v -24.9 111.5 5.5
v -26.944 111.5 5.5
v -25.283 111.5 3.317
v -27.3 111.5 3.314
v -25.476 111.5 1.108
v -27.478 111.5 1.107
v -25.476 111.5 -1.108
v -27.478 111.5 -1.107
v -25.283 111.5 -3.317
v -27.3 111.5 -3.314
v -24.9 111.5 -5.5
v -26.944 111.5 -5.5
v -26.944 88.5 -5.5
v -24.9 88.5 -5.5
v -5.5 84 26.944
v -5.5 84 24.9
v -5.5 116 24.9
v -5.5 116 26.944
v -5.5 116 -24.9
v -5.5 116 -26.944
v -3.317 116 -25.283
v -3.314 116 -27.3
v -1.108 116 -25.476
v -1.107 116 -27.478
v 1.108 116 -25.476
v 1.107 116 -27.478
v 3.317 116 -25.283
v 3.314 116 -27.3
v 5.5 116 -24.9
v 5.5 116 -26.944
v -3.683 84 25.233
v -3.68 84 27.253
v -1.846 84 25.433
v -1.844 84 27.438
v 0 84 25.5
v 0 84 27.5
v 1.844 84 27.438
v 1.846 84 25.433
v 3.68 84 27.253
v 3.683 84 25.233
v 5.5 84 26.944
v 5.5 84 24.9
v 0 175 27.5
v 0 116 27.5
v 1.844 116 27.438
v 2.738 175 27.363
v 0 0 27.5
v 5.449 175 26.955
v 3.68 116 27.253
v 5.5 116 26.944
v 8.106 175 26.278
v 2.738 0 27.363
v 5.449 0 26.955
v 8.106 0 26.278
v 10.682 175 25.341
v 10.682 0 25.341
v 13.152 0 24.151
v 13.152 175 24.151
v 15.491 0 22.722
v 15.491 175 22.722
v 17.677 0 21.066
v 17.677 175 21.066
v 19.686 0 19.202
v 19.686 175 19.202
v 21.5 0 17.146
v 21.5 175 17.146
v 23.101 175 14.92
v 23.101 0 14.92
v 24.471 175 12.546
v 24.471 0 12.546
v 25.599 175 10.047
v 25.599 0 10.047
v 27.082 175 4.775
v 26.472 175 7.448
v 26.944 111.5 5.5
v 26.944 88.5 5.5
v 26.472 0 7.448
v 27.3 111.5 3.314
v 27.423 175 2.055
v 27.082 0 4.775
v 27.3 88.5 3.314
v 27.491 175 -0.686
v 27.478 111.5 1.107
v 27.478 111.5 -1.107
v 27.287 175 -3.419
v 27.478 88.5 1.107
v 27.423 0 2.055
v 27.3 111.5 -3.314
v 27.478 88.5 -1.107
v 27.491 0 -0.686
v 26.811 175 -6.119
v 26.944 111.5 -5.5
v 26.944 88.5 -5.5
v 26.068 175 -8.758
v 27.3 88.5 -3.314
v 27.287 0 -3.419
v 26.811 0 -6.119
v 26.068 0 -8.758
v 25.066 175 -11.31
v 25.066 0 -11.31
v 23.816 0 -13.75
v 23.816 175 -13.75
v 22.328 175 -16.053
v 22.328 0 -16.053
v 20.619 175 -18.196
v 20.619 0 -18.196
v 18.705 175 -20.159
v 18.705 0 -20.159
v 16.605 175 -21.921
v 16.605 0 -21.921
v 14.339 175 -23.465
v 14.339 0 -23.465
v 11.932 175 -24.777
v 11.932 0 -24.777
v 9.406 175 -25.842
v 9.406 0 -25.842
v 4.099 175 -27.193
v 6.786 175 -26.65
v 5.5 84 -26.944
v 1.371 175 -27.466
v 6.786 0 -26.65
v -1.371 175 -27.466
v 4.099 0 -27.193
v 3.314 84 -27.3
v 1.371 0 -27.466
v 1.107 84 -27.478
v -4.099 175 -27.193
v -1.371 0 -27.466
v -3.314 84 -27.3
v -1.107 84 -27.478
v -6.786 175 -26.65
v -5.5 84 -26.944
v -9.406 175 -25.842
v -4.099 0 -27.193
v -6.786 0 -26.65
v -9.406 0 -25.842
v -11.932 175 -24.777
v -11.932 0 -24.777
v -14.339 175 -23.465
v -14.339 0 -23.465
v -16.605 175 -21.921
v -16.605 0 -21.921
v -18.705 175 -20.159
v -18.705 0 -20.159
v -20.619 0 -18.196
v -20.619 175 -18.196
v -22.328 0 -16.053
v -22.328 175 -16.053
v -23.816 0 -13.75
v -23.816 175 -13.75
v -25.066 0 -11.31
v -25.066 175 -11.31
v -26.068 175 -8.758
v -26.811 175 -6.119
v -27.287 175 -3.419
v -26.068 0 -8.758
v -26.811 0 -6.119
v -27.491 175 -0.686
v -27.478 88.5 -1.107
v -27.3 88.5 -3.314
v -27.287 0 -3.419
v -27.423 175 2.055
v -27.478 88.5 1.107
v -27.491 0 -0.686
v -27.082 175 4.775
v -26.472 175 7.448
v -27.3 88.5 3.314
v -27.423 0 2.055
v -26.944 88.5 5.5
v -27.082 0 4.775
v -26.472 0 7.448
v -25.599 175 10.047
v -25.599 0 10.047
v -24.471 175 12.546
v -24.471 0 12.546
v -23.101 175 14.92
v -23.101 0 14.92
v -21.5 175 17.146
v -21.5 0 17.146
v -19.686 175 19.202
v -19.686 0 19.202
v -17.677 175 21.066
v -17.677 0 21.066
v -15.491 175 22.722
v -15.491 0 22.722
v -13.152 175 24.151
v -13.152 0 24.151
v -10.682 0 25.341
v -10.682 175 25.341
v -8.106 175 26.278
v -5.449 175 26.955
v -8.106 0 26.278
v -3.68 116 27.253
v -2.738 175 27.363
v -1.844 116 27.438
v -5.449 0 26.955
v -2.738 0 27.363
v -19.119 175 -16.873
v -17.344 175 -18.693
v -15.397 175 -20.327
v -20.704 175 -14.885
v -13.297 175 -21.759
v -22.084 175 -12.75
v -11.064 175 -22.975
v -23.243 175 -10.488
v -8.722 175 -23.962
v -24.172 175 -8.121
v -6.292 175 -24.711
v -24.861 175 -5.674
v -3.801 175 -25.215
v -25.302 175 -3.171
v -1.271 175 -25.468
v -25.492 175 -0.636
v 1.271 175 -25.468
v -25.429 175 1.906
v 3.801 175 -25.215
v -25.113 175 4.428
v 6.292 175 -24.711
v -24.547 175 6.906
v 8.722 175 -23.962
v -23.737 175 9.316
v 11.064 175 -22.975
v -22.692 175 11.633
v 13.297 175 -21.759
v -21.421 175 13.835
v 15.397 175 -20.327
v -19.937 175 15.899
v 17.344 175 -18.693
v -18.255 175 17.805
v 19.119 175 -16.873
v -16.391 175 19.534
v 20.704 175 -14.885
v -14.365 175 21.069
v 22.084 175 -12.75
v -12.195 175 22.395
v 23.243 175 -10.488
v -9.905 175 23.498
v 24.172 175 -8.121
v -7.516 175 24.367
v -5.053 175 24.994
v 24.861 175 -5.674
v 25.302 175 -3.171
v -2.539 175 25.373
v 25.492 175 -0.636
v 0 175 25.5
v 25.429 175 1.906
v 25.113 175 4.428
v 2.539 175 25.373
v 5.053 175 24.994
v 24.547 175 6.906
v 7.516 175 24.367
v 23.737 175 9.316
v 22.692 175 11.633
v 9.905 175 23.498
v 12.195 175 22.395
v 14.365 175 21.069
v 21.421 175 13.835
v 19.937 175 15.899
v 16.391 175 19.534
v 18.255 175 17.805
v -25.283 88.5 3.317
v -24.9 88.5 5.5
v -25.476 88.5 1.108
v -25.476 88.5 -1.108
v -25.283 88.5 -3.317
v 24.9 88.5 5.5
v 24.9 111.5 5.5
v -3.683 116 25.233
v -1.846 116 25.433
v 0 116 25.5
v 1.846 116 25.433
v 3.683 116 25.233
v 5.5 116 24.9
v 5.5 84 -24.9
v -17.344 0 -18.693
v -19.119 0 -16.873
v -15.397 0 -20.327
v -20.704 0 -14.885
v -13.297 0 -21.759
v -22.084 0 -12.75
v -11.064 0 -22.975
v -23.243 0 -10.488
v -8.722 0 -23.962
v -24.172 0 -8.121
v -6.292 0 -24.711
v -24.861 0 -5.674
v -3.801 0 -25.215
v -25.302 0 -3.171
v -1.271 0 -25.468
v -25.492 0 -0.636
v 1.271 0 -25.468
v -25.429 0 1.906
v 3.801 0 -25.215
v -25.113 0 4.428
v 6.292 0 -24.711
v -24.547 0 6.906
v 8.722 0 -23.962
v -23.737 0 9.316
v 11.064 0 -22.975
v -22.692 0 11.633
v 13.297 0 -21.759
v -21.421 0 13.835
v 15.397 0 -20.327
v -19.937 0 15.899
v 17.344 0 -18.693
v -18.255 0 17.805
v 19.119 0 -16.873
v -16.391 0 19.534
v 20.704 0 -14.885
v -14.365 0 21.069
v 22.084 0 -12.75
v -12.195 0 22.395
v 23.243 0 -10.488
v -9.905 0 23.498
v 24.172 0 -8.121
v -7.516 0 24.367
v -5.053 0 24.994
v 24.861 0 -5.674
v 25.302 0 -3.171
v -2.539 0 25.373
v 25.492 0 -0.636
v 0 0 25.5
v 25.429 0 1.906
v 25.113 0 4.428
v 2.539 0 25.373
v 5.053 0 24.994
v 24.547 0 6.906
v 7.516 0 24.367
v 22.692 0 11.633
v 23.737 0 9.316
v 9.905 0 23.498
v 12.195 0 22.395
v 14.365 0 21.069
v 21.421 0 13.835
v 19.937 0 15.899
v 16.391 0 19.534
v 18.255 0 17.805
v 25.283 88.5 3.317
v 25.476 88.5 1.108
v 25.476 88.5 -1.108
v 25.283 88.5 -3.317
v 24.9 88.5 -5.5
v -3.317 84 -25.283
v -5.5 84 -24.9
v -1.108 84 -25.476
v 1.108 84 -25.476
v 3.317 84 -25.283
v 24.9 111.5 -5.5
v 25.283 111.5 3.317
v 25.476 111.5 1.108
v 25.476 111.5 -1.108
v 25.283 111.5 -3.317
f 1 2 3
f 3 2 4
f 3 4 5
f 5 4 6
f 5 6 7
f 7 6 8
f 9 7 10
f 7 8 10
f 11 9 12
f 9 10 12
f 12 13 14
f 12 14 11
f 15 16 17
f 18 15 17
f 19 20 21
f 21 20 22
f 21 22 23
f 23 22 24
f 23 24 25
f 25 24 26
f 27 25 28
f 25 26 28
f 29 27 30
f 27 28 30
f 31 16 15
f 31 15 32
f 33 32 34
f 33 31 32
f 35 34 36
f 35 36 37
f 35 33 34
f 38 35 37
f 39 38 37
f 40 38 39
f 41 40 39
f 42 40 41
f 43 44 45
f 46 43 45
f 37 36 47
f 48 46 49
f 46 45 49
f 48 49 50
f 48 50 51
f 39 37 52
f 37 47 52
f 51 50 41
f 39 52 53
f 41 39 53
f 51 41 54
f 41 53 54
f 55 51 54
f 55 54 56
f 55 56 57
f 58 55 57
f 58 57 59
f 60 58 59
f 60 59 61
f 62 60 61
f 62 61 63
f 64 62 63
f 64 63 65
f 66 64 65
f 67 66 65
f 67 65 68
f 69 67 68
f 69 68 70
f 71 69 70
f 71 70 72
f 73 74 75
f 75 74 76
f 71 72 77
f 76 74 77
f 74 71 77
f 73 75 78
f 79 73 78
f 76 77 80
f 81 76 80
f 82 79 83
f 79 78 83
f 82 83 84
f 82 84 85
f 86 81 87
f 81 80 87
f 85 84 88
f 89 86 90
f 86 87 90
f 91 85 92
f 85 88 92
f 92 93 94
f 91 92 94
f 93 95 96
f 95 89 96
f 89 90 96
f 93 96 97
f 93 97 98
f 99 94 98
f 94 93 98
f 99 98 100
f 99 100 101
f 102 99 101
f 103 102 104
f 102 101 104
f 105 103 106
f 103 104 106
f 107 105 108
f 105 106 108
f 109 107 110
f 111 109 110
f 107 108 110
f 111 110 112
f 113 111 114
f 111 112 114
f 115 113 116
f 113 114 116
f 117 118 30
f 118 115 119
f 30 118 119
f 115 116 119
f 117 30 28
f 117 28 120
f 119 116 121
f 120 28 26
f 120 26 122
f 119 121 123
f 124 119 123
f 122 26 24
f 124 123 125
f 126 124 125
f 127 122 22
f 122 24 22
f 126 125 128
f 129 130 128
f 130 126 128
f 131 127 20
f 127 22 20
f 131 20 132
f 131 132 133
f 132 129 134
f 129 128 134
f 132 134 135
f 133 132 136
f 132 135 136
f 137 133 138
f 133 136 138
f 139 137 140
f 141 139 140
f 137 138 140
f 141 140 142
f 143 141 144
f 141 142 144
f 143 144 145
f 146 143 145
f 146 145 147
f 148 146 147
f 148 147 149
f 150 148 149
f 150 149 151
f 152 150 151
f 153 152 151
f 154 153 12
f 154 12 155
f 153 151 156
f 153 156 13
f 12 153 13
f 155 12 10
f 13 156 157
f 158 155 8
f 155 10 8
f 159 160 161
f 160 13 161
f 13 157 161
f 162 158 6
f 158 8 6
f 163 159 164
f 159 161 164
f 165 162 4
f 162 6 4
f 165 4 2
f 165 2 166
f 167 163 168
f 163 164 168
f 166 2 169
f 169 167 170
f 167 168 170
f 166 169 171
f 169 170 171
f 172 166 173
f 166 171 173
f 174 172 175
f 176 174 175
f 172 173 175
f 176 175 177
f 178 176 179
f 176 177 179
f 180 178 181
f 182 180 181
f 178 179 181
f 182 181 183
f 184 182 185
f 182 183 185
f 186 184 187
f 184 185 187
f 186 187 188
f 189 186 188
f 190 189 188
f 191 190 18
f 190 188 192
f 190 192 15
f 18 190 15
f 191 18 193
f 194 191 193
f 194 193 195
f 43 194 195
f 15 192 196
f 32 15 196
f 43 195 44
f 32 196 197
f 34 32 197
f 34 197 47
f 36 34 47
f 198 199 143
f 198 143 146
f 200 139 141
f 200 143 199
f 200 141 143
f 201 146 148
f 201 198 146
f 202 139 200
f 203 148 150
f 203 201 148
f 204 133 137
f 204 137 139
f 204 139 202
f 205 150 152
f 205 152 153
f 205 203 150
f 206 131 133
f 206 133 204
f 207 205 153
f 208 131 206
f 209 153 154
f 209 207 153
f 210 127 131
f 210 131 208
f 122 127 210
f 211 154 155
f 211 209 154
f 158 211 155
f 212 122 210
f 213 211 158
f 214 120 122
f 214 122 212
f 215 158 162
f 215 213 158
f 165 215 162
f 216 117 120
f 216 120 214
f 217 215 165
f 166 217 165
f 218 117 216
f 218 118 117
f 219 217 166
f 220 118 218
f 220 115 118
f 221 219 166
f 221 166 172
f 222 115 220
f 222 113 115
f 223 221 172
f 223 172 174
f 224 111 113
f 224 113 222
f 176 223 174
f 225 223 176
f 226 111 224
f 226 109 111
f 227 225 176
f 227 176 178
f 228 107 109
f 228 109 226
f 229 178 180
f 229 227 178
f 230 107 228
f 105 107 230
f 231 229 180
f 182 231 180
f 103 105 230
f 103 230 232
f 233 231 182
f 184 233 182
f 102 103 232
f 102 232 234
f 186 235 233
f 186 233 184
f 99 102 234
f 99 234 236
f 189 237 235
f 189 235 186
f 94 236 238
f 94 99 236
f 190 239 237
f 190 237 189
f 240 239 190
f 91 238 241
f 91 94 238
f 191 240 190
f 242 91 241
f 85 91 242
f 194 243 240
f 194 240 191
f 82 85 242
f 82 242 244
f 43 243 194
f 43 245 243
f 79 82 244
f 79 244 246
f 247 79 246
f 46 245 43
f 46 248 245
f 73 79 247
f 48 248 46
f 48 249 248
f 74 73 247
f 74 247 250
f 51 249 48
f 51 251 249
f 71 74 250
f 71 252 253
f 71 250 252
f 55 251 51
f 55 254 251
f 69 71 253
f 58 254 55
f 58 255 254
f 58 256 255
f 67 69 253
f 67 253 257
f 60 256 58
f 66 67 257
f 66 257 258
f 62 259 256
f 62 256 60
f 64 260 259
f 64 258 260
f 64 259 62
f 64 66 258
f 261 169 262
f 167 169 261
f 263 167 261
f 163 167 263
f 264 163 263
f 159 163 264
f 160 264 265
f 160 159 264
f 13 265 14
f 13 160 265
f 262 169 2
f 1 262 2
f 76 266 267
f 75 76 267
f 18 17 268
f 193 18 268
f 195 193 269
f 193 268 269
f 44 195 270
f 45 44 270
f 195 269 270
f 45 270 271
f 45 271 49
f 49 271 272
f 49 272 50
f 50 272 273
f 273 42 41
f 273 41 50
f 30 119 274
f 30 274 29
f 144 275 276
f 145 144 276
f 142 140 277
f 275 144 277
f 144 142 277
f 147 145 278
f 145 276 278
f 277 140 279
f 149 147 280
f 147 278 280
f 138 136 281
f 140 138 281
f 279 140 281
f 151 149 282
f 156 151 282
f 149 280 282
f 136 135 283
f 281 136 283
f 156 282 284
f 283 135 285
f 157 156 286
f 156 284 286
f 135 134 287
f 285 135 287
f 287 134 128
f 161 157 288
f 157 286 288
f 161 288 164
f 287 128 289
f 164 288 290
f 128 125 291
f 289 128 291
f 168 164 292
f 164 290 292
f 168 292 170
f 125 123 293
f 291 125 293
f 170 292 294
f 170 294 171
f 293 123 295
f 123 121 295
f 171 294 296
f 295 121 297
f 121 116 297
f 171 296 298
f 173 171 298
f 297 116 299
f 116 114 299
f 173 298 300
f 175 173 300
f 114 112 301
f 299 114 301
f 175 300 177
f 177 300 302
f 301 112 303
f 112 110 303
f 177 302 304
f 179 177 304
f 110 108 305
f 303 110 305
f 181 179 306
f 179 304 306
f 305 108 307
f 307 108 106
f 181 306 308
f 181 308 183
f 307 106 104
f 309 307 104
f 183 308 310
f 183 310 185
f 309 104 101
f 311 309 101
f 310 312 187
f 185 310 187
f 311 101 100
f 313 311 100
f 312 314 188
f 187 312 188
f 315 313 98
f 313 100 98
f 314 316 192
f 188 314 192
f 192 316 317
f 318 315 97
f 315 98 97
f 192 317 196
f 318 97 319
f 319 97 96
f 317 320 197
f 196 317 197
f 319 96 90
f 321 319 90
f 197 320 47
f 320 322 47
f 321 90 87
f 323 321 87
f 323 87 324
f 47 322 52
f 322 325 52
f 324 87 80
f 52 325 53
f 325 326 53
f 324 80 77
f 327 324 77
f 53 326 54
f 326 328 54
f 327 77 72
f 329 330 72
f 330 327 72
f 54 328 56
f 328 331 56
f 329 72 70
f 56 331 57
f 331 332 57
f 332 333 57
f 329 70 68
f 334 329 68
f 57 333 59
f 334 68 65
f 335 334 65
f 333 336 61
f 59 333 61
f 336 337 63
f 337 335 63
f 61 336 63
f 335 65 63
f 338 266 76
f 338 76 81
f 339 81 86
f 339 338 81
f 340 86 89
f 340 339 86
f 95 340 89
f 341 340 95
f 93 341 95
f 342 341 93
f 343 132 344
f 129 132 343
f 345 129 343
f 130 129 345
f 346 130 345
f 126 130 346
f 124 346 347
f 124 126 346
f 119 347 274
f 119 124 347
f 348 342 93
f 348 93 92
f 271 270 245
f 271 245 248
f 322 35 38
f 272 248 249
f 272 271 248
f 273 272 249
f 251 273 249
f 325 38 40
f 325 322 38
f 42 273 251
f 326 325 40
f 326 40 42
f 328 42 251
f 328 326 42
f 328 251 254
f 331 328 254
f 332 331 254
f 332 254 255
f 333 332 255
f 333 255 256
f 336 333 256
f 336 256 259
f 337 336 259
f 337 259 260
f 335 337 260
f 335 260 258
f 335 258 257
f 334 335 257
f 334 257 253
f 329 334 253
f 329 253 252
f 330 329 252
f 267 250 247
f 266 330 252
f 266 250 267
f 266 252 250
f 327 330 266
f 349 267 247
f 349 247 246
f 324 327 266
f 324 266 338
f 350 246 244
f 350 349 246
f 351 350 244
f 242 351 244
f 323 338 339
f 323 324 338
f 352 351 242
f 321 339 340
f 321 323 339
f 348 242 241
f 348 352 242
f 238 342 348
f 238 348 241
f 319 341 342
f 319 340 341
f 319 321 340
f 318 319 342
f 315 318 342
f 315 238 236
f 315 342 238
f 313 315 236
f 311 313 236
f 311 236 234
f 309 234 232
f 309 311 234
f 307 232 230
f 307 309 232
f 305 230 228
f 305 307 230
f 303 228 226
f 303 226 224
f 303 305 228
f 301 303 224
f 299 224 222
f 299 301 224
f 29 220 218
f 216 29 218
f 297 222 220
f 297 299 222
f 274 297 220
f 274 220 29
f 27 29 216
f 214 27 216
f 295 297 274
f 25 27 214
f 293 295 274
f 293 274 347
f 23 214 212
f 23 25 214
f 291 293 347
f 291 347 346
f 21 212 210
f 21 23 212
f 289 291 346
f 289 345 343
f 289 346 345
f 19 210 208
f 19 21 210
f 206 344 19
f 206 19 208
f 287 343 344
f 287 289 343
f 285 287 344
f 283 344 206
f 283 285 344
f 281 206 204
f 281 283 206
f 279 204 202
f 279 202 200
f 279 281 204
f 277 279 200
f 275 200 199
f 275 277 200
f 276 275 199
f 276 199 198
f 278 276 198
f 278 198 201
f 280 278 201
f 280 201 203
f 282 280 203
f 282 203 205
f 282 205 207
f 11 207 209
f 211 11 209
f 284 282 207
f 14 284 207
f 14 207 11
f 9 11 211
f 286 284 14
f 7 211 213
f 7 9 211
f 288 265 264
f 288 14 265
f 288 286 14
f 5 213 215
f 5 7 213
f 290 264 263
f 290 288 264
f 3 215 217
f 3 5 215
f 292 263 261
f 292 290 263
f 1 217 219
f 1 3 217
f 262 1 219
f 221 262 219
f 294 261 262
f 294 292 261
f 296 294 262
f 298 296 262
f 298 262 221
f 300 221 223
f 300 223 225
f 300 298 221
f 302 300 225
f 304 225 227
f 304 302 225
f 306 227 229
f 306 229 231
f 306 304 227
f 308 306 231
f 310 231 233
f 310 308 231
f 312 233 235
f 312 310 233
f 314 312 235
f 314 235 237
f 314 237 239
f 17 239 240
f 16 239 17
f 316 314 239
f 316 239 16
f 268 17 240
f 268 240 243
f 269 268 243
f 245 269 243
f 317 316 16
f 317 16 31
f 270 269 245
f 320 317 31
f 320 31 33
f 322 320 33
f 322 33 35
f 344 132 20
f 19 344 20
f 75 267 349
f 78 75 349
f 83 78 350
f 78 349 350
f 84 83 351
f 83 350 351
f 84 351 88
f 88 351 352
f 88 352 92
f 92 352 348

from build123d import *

# Parameters (mm, degrees)
SKETCH1_R               = 27.5
SKETCH1_R_2             = 25.5
BOSS_EXTRUDE1_DEPTH     = 175
CUT_EXTRUDE1_DEPTH      = 180.26935042
CUT_EXTRUDE1_DEPTH_BACK = 180.26935042
SKETCH3_W               = 11
SKETCH3_H               = 23
CUT_EXTRUDE2_DEPTH      = 180.26935042
CUT_EXTRUDE2_DEPTH_BACK = 180.26935042
SKETCH4_W               = 11
SKETCH4_H               = 32


with BuildPart() as part:
    # Sketch1 → Boss-Extrude1 (new body)
    with BuildSketch(Plane(origin=(0, 0, 0), x_dir=(1, 0, 0), z_dir=(0, 1, 0))):
        with Locations(Location((0, 0, 0), (0, 0, 270))):
            Circle(SKETCH1_R)
        with Locations(Location((0, 0, 0), (0, 0, 270))):
            Circle(SKETCH1_R_2, mode=Mode.SUBTRACT)
    extrude(amount=BOSS_EXTRUDE1_DEPTH)

    # Sketch3 → Cut-Extrude1 (cut, two sides: drawn at the far end of the back side and taken through both)
    with BuildSketch(Plane(origin=(0, 0, 0), x_dir=(0, 0, -1), z_dir=(1, 0, 0)).offset(-CUT_EXTRUDE1_DEPTH_BACK)):
        with Locations((0, 100)):
            Rectangle(SKETCH3_W, SKETCH3_H)
    extrude(amount=CUT_EXTRUDE1_DEPTH + CUT_EXTRUDE1_DEPTH_BACK, mode=Mode.SUBTRACT)

    # Sketch4 → Cut-Extrude2 (cut, two sides: drawn at the far end of the back side and taken through both)
    with BuildSketch(Plane.XY.offset(-CUT_EXTRUDE2_DEPTH_BACK)):
        with Locations((0, 100)):
            Rectangle(SKETCH4_W, SKETCH4_H)
    extrude(amount=CUT_EXTRUDE2_DEPTH + CUT_EXTRUDE2_DEPTH_BACK, mode=Mode.SUBTRACT)


solid = part.part
